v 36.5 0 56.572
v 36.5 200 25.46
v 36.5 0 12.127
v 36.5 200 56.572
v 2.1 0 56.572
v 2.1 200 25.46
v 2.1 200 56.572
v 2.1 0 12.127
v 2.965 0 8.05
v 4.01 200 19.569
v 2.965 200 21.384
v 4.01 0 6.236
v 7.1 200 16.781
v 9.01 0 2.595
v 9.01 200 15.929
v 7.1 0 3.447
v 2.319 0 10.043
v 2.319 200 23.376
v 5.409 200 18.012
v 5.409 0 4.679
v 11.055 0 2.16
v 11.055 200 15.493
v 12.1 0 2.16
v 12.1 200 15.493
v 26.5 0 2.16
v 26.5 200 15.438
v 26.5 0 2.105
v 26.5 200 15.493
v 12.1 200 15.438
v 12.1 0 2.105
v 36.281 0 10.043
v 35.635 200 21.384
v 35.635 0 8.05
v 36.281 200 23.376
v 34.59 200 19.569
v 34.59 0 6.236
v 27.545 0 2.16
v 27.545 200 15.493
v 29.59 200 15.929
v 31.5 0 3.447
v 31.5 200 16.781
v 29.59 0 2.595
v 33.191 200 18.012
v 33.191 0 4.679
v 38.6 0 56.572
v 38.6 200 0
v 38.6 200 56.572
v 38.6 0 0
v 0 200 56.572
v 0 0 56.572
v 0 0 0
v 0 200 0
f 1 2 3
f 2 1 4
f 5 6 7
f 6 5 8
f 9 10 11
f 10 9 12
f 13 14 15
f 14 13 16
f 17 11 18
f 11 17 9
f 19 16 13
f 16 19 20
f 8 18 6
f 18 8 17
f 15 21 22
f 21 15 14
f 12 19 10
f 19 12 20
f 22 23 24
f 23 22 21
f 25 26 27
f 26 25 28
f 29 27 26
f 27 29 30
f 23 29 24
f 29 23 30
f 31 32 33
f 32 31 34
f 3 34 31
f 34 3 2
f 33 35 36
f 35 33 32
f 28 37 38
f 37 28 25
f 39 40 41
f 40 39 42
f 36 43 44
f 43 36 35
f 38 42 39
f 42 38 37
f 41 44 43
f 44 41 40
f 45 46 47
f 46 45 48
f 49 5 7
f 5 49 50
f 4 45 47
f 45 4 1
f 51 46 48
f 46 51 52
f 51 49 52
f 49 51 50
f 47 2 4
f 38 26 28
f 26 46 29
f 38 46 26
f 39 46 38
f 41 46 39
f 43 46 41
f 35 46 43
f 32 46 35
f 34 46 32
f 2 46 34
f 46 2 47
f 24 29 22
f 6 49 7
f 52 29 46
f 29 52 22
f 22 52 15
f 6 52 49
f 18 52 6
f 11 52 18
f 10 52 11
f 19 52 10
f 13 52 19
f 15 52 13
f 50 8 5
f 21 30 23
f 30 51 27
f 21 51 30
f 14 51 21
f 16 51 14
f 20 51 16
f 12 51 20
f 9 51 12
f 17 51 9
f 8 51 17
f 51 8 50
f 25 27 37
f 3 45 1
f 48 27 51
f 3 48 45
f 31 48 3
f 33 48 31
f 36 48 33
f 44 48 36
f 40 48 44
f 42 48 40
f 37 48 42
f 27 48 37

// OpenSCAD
// file: physical_dimensions.scad
//Physically bound settings.
printing_play = 0.2; //Horizontal error in 3D printing.
printing_overhang = 50; //Maximum overhang angle. 90 is perfect bridging. 0 is no overhang possible.
printer_width = 200; //Maximum width that we can print. Assuming it is square.
movement_play = 0.2; //Play to leave if stuff has to move past each other.

m3_bolt_radius = 1.5;
m3_nut_radius = 5.5 / 2;
m3_nut_height = 2.4;
m4_bolt_radius = 2;

ball_radius = 15; //Standard pinball size (7/6 inch).
ball_slit = ball_radius * 2 + movement_play * 2 + 4; //Allow 4mm extra space to make the ball fall through faster.
roll_slope = atan2(0.1, 1.5); //About 4 degrees. Minimum slope necessary to make the ball roll with 0.1mm layer height.

cabinet_thickness = 18; //1.8cm wooden planks.
cabinet_plank_width = 196; //Planks are this wide.

flipper_solenoid_width = 13;
flipper_solenoid_height = 15;
flipper_solenoid_length = 30;
flipper_solenoid_pin_radius = 2;
flipper_solenoid_pin_retracted = 8.5; //Length when retracted.
flipper_solenoid_pin_expansion = 10; //Stroke length.
flipper_solenoid_pinhole_position = 2.5; //Distance from centre of hole to tip of pin.
flipper_solenoid_pinhole_radius = m3_bolt_radius;
flipper_solenoid_pingap_thickness = 1.6;
flipper_solenoid_pingap_depth = 7;
flipper_solenoid_screw_radius = m3_bolt_radius;
flipper_solenoid_screw1_position = 8; //Distance from front.
flipper_solenoid_screw2_position = 15 + flipper_solenoid_screw1_position;
flipper_solenoid_screw_depth = 4; //Unknown.

hexkey_radius = 2; //Radius of circumscribed circle around hex key.
hexkey_short_length = 30; //Length of short end.//TODO: How long is this?
hexkey_long_length = 100; //TODO: How long is this?
hexkey_turn_radius = 10; //TODO: Also unknown.

lane_width = 50;
lane_wall_thickness = 0.35 * 6; //6 wall line widths with a 0.4mm 3D printer nozzle.
lane_connector_length = 30; //How much overlap to join multiple lanes together if the printer is too small.
lane_chamfer_radius = 10;

matrix_size = [320, 160]; //Size of LED matrix.

playfield_width = 610;
playfield_height = 1220;
playfield_slope = 6; //Degrees.
playfield_thickness = 18;

plunger_cap_radius = 5; //How far the cap protrudes into the launching lane.
plunger_cap_cone_length = 15;
plunger_gate_alignment_length = 10; //At the front of the gate, how long the alignment ramps are that align the ball in the centre.
plunger_rod_length = 100; //TODO: Buy a rod?
plunger_rod_radius = 2.5;
plunger_handle_overlap = 10; //How far the rod protrudes in the handle.
plunger_handle_radius = 20;
plunger_handle_height = 40;
plunger_spring_length = 50; //How much room we need for the spring.

solenoid_width = 13;
solenoid_height = 15;
solenoid_length = 30;
solenoid_pin_radius = 2;
solenoid_pin_retracted = 8.5; //Length when retracted.
solenoid_pin_expansion = 10; //Stroke length.
solenoid_pinhole_position = 2.5; //Distance from centre of hole to tip of pin.
solenoid_pinhole_radius = m3_bolt_radius;
solenoid_pingap_thickness = 1.6;
solenoid_pingap_depth = 7;
solenoid_screw_radius = m3_bolt_radius;
solenoid_screw1_position = 8; //Distance from front.
solenoid_screw2_position = 15 + solenoid_screw1_position;
solenoid_screw_depth = 4; //Unknown.

space_bottom = 100;
space_top = 100;
space_top_back = 200;

spring_end_thickness = 2; //How thick the attachment part of the spring is.
spring_radius = 4; //Radius of the coil of the spring.
// main file
include <physical_dimensions.scad>

//Calculations.
roll_height = sin(roll_slope) * (printer_width * 2 - lane_connector_length - lane_wall_thickness);

if(version_num() >= 20181007) { //Assertions was merged on 2018-10-7.
	assert(lane_chamfer_radius < ball_radius);
}

module lower_gutter() {
	difference() {
		//Main body.
		cube([lane_wall_thickness * 2 + ball_slit, printer_width, ball_radius * 2 + lane_wall_thickness + roll_height]);
		rotate([roll_slope, 0, 0]) {
			translate([lane_wall_thickness, 0                                                                                                                                                                   , lane_chamfer_radius + lane_wall_thickness]) {
				cube([ball_slit, printer_width * 2, ball_radius * 2 + roll_height]);
			}

			//Left chamfer.
			translate([lane_wall_thickness + lane_chamfer_radius, 0, lane_wall_thickness + lane_chamfer_radius]) {
				rotate([-90, 0, 0]) {
					cylinder(r=lane_chamfer_radius, h=printer_width * 2);
				}
			}
			//Flat bottom between chamfers.
			translate([lane_wall_thickness + lane_chamfer_radius, 0, lane_wall_thickness]) {
				cube([ball_slit - lane_chamfer_radius * 2, printer_width * 2, lane_chamfer_radius]);
			}
			//Right chamfer.
			translate([lane_wall_thickness + ball_slit - lane_chamfer_radius, 0, lane_wall_thickness + lane_chamfer_radius]) {
				rotate([-90, 0, 0]) {
					cylinder(r=lane_chamfer_radius, h=printer_width * 2);
				}
			}
		}
	}
}

lower_gutter();
